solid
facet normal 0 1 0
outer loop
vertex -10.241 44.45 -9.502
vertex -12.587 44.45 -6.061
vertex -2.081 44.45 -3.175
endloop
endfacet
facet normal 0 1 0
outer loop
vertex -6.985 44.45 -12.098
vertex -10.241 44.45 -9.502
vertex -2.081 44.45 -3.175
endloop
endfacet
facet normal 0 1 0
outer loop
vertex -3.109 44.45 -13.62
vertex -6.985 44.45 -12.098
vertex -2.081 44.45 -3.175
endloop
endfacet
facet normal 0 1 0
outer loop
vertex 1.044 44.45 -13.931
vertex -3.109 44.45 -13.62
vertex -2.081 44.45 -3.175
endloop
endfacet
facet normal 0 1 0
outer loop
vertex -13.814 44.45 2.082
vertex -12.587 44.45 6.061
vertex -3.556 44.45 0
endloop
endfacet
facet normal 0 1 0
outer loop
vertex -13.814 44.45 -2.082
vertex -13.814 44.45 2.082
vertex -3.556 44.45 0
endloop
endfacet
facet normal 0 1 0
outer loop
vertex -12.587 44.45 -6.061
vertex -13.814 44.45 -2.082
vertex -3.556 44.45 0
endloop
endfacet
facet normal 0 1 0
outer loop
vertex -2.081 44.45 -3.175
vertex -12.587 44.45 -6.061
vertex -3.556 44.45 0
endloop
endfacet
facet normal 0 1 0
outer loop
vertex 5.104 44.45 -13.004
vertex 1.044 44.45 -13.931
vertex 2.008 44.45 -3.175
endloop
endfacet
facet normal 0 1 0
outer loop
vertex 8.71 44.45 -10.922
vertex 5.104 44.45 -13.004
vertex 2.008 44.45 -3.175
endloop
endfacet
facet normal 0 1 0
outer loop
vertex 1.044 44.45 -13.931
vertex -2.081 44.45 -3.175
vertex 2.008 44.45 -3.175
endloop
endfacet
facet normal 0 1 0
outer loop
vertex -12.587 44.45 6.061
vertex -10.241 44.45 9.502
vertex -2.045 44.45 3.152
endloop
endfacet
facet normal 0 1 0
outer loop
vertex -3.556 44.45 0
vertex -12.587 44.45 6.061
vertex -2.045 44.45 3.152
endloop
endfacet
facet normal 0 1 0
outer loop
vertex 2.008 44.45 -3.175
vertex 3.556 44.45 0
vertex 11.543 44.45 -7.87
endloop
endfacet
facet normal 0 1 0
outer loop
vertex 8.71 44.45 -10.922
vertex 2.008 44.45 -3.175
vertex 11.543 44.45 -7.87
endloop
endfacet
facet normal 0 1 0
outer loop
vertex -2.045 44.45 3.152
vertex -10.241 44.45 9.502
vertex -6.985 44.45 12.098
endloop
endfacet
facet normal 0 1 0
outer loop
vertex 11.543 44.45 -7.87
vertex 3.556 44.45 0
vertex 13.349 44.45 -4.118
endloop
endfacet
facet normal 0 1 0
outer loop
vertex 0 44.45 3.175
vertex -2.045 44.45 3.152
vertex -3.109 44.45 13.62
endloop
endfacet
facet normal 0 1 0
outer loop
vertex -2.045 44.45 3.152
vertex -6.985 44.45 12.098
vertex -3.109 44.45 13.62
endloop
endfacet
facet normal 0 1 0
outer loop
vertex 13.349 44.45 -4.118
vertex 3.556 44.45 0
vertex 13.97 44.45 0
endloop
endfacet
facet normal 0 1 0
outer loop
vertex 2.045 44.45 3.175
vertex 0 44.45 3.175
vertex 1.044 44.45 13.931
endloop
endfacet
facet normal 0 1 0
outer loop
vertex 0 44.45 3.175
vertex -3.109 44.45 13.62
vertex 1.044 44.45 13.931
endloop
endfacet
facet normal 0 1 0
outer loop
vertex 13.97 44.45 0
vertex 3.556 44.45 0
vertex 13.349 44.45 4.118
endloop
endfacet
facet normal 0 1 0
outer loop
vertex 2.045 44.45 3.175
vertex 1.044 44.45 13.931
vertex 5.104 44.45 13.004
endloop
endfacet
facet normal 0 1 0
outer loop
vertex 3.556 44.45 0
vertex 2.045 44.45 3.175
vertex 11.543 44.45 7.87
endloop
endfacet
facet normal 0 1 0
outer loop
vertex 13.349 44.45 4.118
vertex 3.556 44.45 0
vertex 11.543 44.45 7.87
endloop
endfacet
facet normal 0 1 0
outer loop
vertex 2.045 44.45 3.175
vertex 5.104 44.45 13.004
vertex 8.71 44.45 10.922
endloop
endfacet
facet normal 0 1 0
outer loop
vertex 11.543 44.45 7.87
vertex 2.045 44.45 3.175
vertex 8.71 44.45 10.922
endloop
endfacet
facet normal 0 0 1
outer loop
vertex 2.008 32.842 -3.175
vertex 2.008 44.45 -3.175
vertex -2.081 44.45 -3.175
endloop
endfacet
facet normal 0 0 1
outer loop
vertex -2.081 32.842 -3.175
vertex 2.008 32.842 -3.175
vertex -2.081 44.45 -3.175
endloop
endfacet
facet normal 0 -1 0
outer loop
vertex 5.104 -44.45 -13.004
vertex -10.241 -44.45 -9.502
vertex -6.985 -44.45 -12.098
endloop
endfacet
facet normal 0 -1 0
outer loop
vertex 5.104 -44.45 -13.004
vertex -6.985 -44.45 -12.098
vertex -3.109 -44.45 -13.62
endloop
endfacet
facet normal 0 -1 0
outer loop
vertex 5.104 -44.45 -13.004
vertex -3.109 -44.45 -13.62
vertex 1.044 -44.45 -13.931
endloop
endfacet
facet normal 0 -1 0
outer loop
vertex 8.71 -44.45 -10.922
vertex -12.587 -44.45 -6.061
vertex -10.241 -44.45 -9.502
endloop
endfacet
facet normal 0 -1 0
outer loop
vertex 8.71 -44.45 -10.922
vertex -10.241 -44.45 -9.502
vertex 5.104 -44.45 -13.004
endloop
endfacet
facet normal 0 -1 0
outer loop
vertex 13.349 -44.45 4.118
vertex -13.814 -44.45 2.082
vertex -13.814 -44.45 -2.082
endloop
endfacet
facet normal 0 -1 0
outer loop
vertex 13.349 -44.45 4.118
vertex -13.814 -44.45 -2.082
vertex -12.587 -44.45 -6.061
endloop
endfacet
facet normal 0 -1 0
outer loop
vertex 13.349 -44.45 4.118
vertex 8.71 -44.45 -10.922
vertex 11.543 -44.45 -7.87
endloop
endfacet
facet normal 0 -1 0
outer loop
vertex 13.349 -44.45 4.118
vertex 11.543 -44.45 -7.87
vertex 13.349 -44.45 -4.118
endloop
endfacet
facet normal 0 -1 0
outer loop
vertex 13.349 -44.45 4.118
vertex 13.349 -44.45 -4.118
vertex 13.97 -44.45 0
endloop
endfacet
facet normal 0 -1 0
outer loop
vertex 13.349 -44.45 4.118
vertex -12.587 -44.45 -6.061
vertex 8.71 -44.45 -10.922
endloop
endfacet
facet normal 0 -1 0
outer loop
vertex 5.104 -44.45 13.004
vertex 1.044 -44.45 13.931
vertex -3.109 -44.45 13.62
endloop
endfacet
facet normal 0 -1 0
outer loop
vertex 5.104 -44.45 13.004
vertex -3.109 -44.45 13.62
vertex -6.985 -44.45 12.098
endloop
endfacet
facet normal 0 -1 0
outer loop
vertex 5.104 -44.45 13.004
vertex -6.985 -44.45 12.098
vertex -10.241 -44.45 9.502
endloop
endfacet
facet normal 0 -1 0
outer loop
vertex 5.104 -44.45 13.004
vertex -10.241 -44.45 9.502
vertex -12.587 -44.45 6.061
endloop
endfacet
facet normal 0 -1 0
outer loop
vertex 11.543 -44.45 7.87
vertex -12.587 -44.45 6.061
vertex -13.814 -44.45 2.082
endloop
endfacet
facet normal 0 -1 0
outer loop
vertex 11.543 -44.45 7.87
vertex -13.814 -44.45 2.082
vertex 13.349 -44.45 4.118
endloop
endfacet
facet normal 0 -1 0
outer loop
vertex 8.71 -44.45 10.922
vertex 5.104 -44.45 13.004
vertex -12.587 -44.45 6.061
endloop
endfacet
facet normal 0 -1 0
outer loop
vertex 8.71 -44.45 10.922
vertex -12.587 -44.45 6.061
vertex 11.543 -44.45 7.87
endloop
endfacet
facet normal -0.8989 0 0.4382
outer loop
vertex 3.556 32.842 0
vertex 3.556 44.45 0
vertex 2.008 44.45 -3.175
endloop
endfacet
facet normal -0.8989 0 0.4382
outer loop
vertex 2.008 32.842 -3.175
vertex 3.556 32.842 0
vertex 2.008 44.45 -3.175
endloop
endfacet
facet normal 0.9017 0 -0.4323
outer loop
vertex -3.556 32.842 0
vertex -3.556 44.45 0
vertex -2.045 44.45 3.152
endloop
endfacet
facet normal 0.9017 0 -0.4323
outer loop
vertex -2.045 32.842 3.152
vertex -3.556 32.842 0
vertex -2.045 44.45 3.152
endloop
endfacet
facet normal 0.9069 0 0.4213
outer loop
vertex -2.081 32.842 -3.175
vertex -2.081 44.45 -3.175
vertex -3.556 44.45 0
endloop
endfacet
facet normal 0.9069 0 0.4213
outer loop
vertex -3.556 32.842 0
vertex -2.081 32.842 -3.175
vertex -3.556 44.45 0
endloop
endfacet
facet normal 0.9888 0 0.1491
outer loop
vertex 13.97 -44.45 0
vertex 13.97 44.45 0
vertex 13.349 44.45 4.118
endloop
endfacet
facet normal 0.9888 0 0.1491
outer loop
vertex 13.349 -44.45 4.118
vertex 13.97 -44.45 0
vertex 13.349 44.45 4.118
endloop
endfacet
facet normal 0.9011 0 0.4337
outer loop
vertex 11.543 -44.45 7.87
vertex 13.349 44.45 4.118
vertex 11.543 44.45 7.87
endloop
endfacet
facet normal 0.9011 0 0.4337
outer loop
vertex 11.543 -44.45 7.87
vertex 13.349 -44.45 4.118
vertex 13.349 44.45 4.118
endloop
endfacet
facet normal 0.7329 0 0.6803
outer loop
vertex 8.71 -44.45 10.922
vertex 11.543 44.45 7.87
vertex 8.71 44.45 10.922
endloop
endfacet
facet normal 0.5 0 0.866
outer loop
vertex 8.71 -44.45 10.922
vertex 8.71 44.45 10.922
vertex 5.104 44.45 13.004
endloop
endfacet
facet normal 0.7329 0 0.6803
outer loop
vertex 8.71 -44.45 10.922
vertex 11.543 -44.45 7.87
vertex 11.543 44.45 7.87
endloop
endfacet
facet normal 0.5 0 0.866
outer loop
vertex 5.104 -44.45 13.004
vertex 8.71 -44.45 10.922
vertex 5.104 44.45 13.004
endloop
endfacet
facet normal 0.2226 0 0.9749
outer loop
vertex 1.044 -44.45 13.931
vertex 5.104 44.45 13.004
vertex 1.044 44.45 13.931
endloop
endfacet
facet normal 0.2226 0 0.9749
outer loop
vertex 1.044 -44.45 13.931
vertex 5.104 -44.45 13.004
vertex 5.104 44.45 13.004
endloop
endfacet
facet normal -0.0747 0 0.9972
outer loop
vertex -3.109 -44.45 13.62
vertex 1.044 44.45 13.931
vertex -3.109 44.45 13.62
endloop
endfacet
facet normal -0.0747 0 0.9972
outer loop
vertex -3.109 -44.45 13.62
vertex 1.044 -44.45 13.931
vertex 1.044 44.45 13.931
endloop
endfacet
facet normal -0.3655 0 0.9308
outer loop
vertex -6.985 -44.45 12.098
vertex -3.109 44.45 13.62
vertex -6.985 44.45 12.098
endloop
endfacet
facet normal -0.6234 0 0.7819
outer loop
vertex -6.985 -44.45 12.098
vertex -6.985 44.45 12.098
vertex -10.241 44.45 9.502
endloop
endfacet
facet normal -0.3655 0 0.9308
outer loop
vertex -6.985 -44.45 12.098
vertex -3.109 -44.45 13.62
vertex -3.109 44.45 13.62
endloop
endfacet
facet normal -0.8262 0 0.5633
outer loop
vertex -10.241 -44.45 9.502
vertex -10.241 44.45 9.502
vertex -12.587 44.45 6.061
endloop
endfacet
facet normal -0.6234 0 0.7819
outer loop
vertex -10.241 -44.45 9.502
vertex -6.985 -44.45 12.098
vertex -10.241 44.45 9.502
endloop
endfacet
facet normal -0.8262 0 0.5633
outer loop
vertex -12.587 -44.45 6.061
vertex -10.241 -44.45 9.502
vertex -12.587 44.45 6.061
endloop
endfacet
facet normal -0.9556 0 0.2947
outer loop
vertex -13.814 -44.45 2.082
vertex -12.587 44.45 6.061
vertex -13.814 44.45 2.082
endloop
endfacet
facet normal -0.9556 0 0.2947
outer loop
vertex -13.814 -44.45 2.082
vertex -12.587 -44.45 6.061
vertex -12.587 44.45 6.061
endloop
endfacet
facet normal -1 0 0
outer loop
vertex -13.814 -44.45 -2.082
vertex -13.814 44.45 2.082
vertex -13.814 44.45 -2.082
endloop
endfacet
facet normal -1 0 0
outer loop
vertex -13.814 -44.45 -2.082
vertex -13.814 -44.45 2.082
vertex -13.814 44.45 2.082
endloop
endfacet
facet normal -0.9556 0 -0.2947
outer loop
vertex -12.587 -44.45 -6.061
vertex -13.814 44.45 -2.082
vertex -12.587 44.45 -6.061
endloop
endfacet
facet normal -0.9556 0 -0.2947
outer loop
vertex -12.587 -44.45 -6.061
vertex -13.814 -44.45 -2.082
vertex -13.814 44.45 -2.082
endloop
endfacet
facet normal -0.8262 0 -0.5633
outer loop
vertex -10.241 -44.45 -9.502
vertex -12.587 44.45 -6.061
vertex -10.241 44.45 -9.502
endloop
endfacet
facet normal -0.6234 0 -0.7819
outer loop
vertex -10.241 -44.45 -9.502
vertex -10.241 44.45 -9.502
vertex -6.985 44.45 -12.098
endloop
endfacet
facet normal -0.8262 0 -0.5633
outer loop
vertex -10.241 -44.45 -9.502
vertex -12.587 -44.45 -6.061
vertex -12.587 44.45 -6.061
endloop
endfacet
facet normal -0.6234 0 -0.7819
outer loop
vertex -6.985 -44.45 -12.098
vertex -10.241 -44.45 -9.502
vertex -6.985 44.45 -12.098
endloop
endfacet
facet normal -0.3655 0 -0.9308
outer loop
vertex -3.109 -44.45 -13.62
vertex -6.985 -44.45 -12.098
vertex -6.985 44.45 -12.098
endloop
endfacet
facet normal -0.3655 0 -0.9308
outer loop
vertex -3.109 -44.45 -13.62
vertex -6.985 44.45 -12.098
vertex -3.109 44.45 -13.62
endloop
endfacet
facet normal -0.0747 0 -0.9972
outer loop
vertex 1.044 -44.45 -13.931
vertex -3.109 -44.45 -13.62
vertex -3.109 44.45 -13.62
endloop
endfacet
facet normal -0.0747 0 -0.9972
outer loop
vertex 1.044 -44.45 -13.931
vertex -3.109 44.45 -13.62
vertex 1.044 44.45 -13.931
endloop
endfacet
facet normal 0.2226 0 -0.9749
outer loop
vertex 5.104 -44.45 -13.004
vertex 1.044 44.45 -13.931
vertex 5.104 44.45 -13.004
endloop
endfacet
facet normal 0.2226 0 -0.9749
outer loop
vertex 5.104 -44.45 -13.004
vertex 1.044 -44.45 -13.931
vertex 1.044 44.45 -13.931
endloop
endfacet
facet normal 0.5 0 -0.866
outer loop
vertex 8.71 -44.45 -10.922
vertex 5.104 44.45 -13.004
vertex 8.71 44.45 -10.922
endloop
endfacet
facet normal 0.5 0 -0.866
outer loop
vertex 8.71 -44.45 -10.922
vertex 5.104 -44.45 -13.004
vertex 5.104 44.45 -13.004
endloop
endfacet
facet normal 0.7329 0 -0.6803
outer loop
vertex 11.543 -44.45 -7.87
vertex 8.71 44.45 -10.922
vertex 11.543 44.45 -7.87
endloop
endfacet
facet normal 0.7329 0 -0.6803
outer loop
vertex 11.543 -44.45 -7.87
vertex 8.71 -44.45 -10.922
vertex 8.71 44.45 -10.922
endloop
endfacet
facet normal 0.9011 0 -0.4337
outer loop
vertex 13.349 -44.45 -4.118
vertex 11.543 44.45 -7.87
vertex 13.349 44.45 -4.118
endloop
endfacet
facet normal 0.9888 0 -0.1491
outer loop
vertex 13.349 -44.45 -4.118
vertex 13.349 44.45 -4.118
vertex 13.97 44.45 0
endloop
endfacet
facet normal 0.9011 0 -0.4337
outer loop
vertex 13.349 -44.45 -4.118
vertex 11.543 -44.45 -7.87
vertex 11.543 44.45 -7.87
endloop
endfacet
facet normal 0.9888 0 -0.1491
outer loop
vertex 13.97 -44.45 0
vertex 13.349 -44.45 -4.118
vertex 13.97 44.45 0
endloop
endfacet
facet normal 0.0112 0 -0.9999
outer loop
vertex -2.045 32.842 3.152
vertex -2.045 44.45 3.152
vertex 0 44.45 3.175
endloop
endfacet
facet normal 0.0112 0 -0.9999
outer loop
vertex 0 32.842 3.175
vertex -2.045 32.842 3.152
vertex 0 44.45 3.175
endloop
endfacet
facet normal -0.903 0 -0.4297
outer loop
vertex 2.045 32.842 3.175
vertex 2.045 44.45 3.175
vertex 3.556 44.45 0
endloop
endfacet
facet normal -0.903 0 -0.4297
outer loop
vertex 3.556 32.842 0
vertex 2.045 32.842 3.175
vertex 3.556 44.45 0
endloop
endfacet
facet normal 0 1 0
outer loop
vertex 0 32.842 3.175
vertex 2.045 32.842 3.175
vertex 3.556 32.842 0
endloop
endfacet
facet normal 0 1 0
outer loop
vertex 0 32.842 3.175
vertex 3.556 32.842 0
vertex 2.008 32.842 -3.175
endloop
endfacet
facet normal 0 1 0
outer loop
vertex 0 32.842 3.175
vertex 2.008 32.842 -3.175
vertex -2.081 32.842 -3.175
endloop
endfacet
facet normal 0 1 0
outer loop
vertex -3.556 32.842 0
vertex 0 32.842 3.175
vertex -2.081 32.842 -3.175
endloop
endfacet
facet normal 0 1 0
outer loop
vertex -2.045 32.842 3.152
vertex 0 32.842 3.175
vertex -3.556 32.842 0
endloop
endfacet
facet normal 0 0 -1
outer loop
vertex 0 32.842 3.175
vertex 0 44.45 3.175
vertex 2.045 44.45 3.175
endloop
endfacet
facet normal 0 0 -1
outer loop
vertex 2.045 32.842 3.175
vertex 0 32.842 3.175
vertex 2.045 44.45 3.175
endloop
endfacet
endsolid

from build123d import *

# Parameters (mm, degrees)
F0_R     = 13.97
F1_DEPTH = 44.45
F4_DEPTH = 11.6078


with BuildPart() as f1:
    # F0 (on Front) → F1 (new body)
    with BuildSketch(Plane.XZ):
        Circle(F0_R)
    extrude(amount=F1_DEPTH)

    # F2: F1 across plane


with BuildPart() as f1_1:
    add(f1.part)
    add(f1.part.mirror(Plane.XZ))

    # F3 (on face) → F4 (cut)
    with BuildSketch(Plane(origin=(0, 44.45, 0), x_dir=(-1, 0, 0), z_dir=(0, 1, 0))):
        Polygon((2.044567, 3.151697), (0, 3.175), (-2.0447, 3.175), (-3.556, 0), (-2.008188, -3.175), (0.036512, -3.175), (2.081212, -3.175), (3.556, 0), align=None)
    extrude(amount=-F4_DEPTH, mode=Mode.SUBTRACT)


solid = f1_1.part
